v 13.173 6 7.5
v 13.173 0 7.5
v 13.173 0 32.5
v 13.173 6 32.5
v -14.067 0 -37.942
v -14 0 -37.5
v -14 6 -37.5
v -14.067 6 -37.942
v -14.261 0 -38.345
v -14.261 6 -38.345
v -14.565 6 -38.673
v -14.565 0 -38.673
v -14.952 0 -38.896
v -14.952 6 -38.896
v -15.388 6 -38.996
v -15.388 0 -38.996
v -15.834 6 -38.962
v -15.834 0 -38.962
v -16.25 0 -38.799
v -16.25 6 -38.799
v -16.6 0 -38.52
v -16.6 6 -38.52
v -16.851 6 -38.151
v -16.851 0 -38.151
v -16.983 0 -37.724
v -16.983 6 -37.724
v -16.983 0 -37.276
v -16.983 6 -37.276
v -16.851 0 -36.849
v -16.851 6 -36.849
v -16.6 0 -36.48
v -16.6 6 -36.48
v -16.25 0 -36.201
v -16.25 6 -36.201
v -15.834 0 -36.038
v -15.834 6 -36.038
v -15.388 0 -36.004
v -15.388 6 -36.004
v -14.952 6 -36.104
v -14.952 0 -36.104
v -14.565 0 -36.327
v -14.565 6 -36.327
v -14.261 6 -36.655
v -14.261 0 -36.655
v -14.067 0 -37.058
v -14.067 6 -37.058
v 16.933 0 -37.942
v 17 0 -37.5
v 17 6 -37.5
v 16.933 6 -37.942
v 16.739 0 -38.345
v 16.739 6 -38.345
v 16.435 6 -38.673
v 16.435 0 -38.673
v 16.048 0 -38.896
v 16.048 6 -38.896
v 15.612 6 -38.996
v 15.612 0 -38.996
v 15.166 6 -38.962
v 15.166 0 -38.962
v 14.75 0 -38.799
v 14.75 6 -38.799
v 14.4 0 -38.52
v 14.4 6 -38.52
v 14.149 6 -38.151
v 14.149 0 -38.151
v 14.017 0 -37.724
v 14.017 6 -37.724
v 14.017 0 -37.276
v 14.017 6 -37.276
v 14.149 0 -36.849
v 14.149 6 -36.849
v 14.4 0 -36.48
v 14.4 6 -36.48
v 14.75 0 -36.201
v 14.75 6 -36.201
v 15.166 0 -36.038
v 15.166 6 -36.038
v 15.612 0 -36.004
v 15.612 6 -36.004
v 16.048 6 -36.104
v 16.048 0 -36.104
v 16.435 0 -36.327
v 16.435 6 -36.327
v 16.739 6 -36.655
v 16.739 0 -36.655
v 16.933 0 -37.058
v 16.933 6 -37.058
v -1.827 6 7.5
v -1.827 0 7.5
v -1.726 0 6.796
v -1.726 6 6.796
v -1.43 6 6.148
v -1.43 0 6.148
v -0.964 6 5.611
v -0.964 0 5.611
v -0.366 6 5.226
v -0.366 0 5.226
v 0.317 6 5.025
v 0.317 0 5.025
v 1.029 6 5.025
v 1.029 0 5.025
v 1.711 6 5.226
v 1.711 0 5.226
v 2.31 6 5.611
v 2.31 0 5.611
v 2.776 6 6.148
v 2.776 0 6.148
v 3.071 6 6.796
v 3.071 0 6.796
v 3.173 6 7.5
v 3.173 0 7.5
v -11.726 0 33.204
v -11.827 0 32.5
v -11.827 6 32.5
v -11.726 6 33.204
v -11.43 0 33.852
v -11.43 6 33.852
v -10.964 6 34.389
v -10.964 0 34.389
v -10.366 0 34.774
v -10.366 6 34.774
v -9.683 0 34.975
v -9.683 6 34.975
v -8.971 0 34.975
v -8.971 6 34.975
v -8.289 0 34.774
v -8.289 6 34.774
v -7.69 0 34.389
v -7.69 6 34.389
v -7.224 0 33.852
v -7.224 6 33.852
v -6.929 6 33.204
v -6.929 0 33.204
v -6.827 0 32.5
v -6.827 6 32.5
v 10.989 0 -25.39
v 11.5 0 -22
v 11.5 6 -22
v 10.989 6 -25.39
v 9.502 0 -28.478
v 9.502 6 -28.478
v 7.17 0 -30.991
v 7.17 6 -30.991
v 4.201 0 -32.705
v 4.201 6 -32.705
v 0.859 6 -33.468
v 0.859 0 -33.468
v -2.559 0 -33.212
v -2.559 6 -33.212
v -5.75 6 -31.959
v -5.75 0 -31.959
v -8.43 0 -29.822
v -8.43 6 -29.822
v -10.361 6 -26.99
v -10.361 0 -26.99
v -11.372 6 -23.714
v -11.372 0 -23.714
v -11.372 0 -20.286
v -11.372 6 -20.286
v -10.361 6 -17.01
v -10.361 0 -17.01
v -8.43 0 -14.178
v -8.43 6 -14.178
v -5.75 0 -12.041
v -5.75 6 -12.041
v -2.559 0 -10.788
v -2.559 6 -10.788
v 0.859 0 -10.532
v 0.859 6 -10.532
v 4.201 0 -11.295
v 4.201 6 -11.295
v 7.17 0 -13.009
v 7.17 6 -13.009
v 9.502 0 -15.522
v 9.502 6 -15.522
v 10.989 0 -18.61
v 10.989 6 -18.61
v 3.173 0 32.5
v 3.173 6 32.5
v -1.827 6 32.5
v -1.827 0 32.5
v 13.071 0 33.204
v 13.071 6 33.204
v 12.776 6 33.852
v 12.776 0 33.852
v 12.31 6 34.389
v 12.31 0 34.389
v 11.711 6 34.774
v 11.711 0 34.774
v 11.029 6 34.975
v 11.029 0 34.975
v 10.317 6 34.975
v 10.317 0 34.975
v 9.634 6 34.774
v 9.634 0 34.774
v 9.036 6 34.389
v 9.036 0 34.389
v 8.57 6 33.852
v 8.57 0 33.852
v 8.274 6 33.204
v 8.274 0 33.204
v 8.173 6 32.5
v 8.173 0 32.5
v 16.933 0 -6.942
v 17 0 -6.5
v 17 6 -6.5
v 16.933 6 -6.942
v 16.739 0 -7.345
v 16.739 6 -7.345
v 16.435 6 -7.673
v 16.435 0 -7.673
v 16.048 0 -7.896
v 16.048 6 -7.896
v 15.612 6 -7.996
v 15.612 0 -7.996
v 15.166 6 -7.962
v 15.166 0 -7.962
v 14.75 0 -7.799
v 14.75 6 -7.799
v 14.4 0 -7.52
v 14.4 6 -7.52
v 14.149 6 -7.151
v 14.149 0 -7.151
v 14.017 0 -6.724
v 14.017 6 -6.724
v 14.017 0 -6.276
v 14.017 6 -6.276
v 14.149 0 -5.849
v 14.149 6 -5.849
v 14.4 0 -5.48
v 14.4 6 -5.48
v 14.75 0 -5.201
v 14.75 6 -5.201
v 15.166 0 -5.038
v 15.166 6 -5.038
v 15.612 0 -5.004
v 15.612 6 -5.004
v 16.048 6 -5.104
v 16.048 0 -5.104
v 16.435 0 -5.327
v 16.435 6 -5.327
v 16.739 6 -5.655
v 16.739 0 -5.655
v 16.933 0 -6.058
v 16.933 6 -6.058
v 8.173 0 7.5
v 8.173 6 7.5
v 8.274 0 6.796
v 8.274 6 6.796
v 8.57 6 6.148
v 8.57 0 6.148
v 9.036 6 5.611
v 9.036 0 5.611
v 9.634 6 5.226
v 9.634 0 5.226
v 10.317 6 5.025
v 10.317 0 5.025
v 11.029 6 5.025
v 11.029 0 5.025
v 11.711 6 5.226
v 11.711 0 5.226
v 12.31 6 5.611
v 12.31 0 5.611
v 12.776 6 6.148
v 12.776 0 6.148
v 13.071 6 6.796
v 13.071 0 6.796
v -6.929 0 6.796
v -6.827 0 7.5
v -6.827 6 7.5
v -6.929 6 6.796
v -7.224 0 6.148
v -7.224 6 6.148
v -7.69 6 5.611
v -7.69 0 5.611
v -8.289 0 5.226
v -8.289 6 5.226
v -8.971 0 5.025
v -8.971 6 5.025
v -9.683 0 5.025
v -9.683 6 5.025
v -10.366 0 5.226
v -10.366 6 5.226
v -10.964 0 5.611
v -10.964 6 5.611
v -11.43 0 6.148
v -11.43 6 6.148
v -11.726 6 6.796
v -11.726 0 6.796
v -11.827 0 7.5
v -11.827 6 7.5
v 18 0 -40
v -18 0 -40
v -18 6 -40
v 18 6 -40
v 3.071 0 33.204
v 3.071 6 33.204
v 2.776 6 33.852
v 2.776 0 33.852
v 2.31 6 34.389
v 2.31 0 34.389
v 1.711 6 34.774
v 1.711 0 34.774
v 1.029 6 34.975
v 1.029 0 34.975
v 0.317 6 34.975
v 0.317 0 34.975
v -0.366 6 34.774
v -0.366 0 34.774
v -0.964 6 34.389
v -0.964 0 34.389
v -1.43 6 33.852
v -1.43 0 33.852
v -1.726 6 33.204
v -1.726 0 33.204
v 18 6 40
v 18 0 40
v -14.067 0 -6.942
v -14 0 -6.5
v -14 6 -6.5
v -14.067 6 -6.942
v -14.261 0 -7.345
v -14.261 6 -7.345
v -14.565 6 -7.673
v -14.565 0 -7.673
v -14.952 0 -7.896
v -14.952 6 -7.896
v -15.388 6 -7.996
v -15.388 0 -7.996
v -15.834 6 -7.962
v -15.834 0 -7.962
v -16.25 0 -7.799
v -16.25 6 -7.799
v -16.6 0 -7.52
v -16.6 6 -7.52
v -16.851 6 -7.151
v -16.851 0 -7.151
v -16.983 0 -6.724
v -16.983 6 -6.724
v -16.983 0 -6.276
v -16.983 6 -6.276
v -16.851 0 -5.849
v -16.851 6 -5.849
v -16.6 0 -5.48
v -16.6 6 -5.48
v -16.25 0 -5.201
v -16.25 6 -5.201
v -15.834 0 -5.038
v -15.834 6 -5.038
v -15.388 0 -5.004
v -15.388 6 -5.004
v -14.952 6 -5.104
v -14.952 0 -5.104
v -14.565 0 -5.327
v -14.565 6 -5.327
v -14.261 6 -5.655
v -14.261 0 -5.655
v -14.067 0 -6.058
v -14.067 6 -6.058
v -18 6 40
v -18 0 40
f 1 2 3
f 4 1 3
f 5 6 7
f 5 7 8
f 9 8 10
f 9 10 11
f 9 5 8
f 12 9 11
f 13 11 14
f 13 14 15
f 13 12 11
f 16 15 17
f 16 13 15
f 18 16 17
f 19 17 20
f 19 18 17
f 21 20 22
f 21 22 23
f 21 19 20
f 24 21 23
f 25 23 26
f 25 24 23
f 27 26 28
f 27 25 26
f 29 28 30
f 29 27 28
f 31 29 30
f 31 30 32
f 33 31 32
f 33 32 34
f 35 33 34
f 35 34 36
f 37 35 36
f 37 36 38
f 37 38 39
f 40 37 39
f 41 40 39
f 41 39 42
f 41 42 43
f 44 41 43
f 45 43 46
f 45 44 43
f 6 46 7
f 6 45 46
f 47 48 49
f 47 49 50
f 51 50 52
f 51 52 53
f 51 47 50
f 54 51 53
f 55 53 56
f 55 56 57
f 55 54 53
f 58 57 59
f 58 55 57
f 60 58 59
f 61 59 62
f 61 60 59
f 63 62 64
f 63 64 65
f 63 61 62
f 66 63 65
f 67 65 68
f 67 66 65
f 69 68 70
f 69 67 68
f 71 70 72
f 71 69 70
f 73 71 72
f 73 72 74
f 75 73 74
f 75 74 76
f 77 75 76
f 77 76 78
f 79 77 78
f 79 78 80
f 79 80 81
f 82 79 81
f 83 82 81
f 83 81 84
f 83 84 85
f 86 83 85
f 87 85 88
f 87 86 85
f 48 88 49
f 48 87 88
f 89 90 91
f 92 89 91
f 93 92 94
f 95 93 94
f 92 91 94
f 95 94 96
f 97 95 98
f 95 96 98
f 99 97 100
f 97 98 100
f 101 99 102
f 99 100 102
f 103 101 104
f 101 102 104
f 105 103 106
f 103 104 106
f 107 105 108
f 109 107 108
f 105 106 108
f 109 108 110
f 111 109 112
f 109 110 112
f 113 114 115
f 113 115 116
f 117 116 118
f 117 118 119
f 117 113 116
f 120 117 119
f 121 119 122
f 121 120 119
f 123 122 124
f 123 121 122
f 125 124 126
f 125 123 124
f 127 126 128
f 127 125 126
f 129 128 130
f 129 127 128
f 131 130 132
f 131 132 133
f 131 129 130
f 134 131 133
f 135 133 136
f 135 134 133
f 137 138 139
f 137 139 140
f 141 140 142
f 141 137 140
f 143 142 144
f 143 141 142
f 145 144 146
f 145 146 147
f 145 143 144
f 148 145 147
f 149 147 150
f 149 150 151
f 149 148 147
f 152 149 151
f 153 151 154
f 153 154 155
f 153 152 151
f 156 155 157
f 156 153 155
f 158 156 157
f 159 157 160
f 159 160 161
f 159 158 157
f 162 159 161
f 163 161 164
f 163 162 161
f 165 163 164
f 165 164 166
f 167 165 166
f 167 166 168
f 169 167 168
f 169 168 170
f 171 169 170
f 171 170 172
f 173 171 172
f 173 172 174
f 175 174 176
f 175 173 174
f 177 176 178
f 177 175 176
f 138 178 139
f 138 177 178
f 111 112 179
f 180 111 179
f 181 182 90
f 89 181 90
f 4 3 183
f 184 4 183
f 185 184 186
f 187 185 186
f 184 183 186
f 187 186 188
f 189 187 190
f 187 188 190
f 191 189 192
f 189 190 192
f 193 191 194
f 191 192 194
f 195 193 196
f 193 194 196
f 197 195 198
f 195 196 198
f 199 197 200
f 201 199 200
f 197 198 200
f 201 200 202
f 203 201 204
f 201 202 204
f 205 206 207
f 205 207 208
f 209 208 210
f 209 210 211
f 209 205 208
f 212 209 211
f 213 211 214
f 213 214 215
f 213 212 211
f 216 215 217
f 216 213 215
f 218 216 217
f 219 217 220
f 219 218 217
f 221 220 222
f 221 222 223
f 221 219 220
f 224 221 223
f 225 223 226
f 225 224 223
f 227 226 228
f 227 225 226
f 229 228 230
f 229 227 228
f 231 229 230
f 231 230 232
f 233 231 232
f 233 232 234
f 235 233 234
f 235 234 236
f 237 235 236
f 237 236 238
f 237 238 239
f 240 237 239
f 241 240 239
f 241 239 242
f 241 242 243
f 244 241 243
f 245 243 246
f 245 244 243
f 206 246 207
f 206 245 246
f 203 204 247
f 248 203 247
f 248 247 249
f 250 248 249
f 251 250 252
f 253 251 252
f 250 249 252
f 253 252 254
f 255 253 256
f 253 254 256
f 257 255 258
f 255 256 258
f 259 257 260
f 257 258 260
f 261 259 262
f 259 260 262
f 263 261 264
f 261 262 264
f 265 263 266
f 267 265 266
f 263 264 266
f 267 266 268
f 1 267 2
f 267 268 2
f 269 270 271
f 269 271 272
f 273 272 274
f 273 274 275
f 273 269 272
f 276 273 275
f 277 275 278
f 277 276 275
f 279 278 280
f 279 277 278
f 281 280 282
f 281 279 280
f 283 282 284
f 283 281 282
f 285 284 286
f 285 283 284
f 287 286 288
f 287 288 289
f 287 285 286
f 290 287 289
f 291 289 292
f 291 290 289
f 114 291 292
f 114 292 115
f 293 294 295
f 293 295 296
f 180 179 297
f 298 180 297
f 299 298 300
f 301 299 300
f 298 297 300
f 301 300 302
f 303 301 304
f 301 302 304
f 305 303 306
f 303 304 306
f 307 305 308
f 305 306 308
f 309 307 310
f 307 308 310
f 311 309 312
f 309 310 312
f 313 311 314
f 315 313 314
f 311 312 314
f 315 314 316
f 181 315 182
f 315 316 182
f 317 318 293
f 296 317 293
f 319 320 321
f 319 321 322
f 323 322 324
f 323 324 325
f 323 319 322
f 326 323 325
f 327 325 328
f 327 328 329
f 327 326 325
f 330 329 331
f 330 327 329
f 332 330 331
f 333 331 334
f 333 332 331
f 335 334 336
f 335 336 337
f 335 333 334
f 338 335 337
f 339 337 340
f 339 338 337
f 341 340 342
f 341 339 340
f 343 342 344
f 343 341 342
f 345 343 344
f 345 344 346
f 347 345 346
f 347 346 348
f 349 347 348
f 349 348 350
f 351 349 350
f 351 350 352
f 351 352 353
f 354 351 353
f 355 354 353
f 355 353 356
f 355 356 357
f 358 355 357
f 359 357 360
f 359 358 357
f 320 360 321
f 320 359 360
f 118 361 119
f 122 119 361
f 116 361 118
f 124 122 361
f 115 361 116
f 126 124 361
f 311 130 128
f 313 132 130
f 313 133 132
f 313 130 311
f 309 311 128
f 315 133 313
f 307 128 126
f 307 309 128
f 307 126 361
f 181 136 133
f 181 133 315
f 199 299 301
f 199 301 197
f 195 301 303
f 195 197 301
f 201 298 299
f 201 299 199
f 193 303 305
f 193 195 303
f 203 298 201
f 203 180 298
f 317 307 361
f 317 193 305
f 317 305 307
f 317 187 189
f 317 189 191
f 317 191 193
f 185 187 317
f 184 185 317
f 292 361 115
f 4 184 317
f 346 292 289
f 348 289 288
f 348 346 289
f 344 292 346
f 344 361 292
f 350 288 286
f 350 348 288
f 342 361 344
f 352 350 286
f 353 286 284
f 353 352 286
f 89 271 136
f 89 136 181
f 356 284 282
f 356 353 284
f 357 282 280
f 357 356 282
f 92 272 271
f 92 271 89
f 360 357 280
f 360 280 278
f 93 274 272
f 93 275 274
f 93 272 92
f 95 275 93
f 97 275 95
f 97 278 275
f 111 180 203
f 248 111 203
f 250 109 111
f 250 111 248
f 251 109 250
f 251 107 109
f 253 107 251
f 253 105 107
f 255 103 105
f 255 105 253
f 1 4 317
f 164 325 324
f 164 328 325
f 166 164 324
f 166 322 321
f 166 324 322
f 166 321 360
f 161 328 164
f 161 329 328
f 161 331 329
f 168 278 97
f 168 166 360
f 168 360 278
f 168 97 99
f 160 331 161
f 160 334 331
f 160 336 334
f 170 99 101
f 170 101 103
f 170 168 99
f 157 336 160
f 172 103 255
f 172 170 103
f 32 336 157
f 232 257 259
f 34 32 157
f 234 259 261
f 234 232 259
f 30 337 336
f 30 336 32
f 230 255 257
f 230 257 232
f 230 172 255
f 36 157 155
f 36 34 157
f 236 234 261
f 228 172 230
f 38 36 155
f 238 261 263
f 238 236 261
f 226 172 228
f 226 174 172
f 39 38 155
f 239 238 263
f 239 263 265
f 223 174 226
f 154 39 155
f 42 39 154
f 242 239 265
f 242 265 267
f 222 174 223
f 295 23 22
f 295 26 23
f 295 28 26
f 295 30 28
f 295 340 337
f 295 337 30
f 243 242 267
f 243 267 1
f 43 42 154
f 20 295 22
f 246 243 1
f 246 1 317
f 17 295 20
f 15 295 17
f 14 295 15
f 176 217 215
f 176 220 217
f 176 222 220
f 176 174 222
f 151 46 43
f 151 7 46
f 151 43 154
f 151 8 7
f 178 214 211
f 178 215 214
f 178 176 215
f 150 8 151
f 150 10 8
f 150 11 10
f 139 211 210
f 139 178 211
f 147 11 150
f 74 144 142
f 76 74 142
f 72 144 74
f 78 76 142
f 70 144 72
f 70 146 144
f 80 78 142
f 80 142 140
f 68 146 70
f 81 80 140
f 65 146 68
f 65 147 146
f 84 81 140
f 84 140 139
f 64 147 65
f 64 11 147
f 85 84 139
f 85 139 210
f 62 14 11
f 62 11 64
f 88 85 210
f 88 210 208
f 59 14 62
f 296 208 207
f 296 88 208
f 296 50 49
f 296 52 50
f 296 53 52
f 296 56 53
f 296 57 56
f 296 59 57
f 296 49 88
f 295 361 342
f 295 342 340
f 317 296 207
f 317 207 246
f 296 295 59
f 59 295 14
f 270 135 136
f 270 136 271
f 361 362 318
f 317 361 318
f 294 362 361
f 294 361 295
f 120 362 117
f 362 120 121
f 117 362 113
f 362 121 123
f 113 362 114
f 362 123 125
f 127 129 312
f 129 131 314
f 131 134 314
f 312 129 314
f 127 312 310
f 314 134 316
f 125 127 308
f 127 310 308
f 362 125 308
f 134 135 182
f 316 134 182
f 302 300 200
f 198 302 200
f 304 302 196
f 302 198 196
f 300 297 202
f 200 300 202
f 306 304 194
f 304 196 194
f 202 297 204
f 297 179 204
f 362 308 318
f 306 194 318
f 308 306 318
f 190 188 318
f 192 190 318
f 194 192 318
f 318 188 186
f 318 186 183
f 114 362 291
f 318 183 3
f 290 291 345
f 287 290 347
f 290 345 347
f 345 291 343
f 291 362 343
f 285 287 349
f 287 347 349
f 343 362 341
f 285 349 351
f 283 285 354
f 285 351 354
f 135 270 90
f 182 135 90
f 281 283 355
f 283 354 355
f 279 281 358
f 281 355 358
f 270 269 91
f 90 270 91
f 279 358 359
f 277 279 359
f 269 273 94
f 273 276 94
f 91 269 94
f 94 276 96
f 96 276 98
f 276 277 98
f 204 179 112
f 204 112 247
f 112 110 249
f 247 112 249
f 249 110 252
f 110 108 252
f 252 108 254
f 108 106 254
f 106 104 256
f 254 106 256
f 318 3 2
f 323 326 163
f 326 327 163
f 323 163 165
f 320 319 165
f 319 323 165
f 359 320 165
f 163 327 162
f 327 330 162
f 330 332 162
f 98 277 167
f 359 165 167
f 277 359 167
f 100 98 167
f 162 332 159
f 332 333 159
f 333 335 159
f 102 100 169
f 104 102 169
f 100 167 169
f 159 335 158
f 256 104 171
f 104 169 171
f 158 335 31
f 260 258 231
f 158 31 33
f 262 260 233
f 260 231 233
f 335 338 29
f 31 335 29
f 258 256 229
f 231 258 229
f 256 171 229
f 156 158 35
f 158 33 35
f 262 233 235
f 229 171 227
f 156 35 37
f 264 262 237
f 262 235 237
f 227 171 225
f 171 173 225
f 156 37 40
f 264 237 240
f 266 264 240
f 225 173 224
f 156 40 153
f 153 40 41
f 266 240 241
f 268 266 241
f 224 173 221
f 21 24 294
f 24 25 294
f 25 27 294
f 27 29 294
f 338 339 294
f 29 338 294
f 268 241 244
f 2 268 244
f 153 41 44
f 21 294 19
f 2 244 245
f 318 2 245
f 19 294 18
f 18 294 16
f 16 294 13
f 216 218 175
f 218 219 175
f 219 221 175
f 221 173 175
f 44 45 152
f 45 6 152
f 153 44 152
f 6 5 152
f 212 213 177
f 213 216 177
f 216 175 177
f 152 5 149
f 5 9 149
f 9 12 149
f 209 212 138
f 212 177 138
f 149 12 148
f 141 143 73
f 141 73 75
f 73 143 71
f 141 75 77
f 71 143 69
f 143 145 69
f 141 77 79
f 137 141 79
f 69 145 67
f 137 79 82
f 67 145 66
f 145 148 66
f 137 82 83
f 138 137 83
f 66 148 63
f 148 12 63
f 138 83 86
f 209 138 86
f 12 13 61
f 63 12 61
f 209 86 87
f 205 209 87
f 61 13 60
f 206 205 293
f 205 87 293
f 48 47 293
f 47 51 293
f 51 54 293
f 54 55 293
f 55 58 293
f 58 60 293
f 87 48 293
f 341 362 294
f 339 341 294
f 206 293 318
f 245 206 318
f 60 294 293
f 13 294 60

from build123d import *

# Parameters (mm, degrees)
SKETCH1_W           = 36
SKETCH1_H           = 80
SKETCH1_R           = 11.5
SKETCH1_R_2         = 1.5
BOSS_EXTRUDE1_DEPTH = 6


with BuildPart() as part:
    # Sketch1 → Boss-Extrude1 (new body)
    with BuildSketch(Plane(origin=(0, 0, 0), x_dir=(1, 0, 0), z_dir=(0, 1, 0))):
        Rectangle(SKETCH1_W, SKETCH1_H)
        with Locations((0, 22)):
            Circle(SKETCH1_R, mode=Mode.SUBTRACT)
        with Locations((-15.5, 37.5)):
            Circle(SKETCH1_R_2, mode=Mode.SUBTRACT)
        with Locations((15.5, 37.5)):
            Circle(SKETCH1_R_2, mode=Mode.SUBTRACT)
        with Locations((15.5, 6.5)):
            Circle(SKETCH1_R_2, mode=Mode.SUBTRACT)
        with Locations((-15.5, 6.5)):
            Circle(SKETCH1_R_2, mode=Mode.SUBTRACT)
        with BuildLine():
            Line((-1.827248673, -32.5), (-1.827248673, -7.5))
            ThreePointArc((-1.827248673, -7.5), (0.672751327, -5), (3.172751327, -7.5))
            Line((3.172751327, -7.5), (3.172751327, -32.5))
            ThreePointArc((3.172751327, -32.5), (0.672751327, -35), (-1.827248673, -32.5))
        make_face(mode=Mode.SUBTRACT)
        with BuildLine():
            Line((8.172751327, -32.5), (8.172751327, -7.5))
            ThreePointArc((8.172751327, -7.5), (10.672751327, -5), (13.172751327, -7.5))
            Line((13.172751327, -7.5), (13.172751327, -32.5))
            ThreePointArc((13.172751327, -32.5), (10.672751327, -35), (8.172751327, -32.5))
        make_face(mode=Mode.SUBTRACT)
        with BuildLine():
            Line((-6.827248673, -32.5), (-6.827248673, -7.5))
            ThreePointArc((-6.827248673, -7.5), (-9.327248673, -5), (-11.827248673, -7.5))
            Line((-11.827248673, -7.5), (-11.827248673, -32.5))
            ThreePointArc((-11.827248673, -32.5), (-9.327248673, -35), (-6.827248673, -32.5))
        make_face(mode=Mode.SUBTRACT)
    extrude(amount=BOSS_EXTRUDE1_DEPTH)


solid = part.part
